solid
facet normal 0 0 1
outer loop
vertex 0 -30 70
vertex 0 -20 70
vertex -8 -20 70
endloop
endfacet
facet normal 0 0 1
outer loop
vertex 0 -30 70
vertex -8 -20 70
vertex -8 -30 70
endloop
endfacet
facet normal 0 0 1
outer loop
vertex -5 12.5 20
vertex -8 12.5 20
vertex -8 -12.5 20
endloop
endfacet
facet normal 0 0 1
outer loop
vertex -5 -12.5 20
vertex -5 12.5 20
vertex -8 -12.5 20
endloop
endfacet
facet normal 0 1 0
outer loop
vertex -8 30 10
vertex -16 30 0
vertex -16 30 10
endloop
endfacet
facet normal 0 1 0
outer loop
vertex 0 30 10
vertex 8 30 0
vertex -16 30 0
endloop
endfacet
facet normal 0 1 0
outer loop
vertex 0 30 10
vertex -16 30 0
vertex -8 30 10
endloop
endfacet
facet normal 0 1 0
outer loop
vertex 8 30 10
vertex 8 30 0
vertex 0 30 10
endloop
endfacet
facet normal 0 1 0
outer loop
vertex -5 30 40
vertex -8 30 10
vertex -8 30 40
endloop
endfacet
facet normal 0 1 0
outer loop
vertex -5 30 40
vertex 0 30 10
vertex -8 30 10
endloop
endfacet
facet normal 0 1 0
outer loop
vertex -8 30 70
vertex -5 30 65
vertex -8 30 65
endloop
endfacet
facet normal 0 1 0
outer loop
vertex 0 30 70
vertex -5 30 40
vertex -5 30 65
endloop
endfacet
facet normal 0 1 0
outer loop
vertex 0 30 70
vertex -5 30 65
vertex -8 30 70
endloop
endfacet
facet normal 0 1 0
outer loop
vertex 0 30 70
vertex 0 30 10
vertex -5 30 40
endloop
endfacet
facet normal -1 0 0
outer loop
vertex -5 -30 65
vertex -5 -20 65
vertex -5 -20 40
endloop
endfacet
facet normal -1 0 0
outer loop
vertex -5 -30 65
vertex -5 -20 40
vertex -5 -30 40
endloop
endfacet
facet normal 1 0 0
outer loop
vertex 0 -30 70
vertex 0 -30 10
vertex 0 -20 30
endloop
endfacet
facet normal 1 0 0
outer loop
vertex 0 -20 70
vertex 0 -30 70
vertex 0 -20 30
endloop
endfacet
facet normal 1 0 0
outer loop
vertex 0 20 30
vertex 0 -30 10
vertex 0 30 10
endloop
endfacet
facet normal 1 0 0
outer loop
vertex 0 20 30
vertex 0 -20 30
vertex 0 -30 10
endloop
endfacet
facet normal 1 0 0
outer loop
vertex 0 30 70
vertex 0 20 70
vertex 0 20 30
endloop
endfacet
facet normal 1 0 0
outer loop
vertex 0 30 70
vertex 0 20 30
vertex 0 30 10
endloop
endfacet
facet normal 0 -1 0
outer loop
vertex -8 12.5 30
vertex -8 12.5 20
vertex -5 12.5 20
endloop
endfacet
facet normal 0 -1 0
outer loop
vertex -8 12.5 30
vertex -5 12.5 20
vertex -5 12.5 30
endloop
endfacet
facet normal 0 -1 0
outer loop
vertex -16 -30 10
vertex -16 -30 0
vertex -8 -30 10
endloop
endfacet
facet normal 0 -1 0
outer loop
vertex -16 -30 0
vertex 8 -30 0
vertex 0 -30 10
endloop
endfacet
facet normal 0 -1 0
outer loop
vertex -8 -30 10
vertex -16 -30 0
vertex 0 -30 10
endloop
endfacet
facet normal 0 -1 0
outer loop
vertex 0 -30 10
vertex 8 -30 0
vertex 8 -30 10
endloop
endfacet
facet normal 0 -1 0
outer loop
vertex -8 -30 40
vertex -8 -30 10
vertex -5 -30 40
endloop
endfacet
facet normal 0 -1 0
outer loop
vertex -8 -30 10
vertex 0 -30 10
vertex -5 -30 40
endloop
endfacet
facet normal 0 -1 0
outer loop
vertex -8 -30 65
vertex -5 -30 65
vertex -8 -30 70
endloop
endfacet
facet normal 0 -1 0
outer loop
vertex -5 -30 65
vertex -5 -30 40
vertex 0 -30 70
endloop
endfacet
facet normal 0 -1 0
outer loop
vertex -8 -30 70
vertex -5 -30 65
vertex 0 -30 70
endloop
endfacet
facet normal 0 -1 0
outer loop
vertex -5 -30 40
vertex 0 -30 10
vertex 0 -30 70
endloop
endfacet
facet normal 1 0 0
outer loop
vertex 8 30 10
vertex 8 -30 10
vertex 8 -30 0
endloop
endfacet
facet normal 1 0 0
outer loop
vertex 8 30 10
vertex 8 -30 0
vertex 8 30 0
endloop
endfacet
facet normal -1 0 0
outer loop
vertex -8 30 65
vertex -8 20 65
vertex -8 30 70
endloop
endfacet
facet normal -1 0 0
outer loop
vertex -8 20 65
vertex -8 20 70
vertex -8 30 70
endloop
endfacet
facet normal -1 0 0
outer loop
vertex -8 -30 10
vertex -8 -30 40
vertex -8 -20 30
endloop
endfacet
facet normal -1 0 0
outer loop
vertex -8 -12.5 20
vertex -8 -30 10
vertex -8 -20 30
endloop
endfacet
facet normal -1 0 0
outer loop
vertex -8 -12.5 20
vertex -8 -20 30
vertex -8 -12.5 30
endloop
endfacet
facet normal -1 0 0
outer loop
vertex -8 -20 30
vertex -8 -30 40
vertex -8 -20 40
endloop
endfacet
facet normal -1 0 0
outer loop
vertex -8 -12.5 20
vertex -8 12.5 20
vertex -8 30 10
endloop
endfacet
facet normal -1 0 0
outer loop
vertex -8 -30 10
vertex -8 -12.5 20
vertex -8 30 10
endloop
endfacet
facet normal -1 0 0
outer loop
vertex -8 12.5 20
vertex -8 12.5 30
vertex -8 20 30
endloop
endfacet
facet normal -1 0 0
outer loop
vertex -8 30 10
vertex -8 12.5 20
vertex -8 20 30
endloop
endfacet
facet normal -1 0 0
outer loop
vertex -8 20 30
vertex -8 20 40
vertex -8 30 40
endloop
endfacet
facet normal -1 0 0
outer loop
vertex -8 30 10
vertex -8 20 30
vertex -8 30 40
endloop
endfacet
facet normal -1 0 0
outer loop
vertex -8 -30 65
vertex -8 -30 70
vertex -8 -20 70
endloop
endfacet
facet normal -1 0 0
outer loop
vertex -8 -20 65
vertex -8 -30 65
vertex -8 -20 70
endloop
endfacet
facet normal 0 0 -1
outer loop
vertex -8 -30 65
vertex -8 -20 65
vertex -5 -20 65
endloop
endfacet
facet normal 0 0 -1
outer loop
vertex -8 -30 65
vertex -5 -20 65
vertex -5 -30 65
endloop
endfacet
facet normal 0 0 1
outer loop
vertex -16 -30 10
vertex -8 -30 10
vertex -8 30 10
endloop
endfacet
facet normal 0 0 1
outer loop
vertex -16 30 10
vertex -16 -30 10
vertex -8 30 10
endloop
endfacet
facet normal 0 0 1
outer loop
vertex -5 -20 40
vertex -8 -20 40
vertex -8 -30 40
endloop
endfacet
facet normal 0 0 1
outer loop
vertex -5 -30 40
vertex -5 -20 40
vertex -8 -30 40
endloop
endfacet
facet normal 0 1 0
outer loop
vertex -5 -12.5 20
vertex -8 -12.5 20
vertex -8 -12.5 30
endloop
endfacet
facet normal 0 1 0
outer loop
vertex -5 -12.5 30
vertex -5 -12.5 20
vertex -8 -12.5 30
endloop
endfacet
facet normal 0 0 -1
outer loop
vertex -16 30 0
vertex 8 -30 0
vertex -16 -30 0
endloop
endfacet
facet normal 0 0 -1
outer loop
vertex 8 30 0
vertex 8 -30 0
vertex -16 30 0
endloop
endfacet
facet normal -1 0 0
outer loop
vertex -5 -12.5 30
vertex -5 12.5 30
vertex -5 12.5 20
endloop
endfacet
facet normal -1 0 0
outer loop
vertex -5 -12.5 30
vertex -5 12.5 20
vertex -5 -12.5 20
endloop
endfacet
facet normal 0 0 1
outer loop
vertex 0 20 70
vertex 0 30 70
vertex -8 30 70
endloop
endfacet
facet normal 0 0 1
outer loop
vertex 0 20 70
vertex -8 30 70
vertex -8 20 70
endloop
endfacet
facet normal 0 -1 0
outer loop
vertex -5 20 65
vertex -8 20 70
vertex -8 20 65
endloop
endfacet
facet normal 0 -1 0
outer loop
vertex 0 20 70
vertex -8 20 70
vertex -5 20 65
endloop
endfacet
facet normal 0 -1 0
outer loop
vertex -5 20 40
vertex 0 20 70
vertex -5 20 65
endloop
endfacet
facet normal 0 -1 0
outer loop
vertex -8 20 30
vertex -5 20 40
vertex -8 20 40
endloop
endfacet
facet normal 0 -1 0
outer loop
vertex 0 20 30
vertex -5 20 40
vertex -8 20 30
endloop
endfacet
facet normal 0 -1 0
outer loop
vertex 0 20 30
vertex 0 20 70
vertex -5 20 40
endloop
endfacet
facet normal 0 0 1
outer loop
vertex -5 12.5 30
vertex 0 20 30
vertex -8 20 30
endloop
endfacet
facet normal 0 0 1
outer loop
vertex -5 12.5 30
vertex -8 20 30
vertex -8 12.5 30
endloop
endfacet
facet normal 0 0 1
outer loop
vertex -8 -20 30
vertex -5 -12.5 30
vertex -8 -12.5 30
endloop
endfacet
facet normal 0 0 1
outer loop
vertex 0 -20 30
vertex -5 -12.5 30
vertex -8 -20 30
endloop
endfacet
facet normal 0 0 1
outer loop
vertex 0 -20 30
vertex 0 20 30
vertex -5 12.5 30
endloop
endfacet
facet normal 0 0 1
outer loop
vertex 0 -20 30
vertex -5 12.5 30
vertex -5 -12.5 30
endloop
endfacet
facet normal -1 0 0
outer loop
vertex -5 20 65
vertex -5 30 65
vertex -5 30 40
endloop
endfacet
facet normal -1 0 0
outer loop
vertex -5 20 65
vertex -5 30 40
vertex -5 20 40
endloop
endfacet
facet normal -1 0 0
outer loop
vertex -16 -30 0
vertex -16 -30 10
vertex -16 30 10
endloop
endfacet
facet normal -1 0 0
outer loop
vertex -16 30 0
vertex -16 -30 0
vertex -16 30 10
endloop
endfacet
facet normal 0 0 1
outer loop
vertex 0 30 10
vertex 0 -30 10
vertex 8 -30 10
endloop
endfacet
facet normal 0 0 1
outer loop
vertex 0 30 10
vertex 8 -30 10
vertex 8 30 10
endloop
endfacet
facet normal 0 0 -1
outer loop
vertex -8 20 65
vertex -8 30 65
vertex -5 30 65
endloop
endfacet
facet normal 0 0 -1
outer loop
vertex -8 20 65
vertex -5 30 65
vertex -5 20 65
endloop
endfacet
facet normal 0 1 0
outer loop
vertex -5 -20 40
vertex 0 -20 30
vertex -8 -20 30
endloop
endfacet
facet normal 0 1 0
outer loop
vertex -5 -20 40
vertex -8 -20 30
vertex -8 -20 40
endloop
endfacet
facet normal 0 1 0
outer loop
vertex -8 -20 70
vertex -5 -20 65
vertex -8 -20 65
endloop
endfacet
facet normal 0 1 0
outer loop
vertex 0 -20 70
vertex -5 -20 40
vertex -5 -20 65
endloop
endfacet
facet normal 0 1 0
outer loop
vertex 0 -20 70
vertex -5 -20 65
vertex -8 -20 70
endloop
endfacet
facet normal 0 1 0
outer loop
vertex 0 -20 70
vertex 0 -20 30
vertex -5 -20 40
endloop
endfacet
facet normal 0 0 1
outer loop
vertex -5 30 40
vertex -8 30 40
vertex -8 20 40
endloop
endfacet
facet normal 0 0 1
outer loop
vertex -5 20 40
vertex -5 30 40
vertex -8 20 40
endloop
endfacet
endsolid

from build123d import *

# Parameters (mm, degrees)
F0_W     = 60
F0_H     = 10
F1_DEPTH = 8
F2_DEPTH = 8
F3_W     = 10
F3_H     = 25
F3_W_2   = 25
F3_H_2   = 10
F4_DEPTH = 3
F5_DEPTH = 16


with BuildPart() as f1:
    # F0 (on Right) → F1 (new body)
    with BuildSketch(Plane.YZ):
        with Locations((0, 5)):
            Rectangle(F0_W, F0_H)
        Polygon((-30, 70), (-30, 10), (30, 10), (30, 70), (20, 70), (20, 30), (-20, 30), (-20, 70), align=None)
    extrude(amount=-F1_DEPTH)

    # F0 (on Right) → F2 (join)
    with BuildSketch(Plane.YZ):
        with Locations((0, 5)):
            Rectangle(F0_W, F0_H)
    extrude(amount=F2_DEPTH)

    # F3 (on face) → F4 (cut)
    with BuildSketch(Plane(origin=(-8, 0, 0), x_dir=(0, -1, 0), z_dir=(-1, 0, 0))):
        with Locations((-25, 52.5)):
            Rectangle(F3_W, F3_H)
        with Locations((25, 52.5)):
            Rectangle(F3_W, F3_H)
        with Locations((0, 25)):
            Rectangle(F3_W_2, F3_H_2)
    extrude(amount=-F4_DEPTH, mode=Mode.SUBTRACT)

    # F0 (on Right) → F5 (join)
    with BuildSketch(Plane.YZ):
        with Locations((0, 5)):
            Rectangle(F0_W, F0_H)
    extrude(amount=-F5_DEPTH)


solid = f1.part
